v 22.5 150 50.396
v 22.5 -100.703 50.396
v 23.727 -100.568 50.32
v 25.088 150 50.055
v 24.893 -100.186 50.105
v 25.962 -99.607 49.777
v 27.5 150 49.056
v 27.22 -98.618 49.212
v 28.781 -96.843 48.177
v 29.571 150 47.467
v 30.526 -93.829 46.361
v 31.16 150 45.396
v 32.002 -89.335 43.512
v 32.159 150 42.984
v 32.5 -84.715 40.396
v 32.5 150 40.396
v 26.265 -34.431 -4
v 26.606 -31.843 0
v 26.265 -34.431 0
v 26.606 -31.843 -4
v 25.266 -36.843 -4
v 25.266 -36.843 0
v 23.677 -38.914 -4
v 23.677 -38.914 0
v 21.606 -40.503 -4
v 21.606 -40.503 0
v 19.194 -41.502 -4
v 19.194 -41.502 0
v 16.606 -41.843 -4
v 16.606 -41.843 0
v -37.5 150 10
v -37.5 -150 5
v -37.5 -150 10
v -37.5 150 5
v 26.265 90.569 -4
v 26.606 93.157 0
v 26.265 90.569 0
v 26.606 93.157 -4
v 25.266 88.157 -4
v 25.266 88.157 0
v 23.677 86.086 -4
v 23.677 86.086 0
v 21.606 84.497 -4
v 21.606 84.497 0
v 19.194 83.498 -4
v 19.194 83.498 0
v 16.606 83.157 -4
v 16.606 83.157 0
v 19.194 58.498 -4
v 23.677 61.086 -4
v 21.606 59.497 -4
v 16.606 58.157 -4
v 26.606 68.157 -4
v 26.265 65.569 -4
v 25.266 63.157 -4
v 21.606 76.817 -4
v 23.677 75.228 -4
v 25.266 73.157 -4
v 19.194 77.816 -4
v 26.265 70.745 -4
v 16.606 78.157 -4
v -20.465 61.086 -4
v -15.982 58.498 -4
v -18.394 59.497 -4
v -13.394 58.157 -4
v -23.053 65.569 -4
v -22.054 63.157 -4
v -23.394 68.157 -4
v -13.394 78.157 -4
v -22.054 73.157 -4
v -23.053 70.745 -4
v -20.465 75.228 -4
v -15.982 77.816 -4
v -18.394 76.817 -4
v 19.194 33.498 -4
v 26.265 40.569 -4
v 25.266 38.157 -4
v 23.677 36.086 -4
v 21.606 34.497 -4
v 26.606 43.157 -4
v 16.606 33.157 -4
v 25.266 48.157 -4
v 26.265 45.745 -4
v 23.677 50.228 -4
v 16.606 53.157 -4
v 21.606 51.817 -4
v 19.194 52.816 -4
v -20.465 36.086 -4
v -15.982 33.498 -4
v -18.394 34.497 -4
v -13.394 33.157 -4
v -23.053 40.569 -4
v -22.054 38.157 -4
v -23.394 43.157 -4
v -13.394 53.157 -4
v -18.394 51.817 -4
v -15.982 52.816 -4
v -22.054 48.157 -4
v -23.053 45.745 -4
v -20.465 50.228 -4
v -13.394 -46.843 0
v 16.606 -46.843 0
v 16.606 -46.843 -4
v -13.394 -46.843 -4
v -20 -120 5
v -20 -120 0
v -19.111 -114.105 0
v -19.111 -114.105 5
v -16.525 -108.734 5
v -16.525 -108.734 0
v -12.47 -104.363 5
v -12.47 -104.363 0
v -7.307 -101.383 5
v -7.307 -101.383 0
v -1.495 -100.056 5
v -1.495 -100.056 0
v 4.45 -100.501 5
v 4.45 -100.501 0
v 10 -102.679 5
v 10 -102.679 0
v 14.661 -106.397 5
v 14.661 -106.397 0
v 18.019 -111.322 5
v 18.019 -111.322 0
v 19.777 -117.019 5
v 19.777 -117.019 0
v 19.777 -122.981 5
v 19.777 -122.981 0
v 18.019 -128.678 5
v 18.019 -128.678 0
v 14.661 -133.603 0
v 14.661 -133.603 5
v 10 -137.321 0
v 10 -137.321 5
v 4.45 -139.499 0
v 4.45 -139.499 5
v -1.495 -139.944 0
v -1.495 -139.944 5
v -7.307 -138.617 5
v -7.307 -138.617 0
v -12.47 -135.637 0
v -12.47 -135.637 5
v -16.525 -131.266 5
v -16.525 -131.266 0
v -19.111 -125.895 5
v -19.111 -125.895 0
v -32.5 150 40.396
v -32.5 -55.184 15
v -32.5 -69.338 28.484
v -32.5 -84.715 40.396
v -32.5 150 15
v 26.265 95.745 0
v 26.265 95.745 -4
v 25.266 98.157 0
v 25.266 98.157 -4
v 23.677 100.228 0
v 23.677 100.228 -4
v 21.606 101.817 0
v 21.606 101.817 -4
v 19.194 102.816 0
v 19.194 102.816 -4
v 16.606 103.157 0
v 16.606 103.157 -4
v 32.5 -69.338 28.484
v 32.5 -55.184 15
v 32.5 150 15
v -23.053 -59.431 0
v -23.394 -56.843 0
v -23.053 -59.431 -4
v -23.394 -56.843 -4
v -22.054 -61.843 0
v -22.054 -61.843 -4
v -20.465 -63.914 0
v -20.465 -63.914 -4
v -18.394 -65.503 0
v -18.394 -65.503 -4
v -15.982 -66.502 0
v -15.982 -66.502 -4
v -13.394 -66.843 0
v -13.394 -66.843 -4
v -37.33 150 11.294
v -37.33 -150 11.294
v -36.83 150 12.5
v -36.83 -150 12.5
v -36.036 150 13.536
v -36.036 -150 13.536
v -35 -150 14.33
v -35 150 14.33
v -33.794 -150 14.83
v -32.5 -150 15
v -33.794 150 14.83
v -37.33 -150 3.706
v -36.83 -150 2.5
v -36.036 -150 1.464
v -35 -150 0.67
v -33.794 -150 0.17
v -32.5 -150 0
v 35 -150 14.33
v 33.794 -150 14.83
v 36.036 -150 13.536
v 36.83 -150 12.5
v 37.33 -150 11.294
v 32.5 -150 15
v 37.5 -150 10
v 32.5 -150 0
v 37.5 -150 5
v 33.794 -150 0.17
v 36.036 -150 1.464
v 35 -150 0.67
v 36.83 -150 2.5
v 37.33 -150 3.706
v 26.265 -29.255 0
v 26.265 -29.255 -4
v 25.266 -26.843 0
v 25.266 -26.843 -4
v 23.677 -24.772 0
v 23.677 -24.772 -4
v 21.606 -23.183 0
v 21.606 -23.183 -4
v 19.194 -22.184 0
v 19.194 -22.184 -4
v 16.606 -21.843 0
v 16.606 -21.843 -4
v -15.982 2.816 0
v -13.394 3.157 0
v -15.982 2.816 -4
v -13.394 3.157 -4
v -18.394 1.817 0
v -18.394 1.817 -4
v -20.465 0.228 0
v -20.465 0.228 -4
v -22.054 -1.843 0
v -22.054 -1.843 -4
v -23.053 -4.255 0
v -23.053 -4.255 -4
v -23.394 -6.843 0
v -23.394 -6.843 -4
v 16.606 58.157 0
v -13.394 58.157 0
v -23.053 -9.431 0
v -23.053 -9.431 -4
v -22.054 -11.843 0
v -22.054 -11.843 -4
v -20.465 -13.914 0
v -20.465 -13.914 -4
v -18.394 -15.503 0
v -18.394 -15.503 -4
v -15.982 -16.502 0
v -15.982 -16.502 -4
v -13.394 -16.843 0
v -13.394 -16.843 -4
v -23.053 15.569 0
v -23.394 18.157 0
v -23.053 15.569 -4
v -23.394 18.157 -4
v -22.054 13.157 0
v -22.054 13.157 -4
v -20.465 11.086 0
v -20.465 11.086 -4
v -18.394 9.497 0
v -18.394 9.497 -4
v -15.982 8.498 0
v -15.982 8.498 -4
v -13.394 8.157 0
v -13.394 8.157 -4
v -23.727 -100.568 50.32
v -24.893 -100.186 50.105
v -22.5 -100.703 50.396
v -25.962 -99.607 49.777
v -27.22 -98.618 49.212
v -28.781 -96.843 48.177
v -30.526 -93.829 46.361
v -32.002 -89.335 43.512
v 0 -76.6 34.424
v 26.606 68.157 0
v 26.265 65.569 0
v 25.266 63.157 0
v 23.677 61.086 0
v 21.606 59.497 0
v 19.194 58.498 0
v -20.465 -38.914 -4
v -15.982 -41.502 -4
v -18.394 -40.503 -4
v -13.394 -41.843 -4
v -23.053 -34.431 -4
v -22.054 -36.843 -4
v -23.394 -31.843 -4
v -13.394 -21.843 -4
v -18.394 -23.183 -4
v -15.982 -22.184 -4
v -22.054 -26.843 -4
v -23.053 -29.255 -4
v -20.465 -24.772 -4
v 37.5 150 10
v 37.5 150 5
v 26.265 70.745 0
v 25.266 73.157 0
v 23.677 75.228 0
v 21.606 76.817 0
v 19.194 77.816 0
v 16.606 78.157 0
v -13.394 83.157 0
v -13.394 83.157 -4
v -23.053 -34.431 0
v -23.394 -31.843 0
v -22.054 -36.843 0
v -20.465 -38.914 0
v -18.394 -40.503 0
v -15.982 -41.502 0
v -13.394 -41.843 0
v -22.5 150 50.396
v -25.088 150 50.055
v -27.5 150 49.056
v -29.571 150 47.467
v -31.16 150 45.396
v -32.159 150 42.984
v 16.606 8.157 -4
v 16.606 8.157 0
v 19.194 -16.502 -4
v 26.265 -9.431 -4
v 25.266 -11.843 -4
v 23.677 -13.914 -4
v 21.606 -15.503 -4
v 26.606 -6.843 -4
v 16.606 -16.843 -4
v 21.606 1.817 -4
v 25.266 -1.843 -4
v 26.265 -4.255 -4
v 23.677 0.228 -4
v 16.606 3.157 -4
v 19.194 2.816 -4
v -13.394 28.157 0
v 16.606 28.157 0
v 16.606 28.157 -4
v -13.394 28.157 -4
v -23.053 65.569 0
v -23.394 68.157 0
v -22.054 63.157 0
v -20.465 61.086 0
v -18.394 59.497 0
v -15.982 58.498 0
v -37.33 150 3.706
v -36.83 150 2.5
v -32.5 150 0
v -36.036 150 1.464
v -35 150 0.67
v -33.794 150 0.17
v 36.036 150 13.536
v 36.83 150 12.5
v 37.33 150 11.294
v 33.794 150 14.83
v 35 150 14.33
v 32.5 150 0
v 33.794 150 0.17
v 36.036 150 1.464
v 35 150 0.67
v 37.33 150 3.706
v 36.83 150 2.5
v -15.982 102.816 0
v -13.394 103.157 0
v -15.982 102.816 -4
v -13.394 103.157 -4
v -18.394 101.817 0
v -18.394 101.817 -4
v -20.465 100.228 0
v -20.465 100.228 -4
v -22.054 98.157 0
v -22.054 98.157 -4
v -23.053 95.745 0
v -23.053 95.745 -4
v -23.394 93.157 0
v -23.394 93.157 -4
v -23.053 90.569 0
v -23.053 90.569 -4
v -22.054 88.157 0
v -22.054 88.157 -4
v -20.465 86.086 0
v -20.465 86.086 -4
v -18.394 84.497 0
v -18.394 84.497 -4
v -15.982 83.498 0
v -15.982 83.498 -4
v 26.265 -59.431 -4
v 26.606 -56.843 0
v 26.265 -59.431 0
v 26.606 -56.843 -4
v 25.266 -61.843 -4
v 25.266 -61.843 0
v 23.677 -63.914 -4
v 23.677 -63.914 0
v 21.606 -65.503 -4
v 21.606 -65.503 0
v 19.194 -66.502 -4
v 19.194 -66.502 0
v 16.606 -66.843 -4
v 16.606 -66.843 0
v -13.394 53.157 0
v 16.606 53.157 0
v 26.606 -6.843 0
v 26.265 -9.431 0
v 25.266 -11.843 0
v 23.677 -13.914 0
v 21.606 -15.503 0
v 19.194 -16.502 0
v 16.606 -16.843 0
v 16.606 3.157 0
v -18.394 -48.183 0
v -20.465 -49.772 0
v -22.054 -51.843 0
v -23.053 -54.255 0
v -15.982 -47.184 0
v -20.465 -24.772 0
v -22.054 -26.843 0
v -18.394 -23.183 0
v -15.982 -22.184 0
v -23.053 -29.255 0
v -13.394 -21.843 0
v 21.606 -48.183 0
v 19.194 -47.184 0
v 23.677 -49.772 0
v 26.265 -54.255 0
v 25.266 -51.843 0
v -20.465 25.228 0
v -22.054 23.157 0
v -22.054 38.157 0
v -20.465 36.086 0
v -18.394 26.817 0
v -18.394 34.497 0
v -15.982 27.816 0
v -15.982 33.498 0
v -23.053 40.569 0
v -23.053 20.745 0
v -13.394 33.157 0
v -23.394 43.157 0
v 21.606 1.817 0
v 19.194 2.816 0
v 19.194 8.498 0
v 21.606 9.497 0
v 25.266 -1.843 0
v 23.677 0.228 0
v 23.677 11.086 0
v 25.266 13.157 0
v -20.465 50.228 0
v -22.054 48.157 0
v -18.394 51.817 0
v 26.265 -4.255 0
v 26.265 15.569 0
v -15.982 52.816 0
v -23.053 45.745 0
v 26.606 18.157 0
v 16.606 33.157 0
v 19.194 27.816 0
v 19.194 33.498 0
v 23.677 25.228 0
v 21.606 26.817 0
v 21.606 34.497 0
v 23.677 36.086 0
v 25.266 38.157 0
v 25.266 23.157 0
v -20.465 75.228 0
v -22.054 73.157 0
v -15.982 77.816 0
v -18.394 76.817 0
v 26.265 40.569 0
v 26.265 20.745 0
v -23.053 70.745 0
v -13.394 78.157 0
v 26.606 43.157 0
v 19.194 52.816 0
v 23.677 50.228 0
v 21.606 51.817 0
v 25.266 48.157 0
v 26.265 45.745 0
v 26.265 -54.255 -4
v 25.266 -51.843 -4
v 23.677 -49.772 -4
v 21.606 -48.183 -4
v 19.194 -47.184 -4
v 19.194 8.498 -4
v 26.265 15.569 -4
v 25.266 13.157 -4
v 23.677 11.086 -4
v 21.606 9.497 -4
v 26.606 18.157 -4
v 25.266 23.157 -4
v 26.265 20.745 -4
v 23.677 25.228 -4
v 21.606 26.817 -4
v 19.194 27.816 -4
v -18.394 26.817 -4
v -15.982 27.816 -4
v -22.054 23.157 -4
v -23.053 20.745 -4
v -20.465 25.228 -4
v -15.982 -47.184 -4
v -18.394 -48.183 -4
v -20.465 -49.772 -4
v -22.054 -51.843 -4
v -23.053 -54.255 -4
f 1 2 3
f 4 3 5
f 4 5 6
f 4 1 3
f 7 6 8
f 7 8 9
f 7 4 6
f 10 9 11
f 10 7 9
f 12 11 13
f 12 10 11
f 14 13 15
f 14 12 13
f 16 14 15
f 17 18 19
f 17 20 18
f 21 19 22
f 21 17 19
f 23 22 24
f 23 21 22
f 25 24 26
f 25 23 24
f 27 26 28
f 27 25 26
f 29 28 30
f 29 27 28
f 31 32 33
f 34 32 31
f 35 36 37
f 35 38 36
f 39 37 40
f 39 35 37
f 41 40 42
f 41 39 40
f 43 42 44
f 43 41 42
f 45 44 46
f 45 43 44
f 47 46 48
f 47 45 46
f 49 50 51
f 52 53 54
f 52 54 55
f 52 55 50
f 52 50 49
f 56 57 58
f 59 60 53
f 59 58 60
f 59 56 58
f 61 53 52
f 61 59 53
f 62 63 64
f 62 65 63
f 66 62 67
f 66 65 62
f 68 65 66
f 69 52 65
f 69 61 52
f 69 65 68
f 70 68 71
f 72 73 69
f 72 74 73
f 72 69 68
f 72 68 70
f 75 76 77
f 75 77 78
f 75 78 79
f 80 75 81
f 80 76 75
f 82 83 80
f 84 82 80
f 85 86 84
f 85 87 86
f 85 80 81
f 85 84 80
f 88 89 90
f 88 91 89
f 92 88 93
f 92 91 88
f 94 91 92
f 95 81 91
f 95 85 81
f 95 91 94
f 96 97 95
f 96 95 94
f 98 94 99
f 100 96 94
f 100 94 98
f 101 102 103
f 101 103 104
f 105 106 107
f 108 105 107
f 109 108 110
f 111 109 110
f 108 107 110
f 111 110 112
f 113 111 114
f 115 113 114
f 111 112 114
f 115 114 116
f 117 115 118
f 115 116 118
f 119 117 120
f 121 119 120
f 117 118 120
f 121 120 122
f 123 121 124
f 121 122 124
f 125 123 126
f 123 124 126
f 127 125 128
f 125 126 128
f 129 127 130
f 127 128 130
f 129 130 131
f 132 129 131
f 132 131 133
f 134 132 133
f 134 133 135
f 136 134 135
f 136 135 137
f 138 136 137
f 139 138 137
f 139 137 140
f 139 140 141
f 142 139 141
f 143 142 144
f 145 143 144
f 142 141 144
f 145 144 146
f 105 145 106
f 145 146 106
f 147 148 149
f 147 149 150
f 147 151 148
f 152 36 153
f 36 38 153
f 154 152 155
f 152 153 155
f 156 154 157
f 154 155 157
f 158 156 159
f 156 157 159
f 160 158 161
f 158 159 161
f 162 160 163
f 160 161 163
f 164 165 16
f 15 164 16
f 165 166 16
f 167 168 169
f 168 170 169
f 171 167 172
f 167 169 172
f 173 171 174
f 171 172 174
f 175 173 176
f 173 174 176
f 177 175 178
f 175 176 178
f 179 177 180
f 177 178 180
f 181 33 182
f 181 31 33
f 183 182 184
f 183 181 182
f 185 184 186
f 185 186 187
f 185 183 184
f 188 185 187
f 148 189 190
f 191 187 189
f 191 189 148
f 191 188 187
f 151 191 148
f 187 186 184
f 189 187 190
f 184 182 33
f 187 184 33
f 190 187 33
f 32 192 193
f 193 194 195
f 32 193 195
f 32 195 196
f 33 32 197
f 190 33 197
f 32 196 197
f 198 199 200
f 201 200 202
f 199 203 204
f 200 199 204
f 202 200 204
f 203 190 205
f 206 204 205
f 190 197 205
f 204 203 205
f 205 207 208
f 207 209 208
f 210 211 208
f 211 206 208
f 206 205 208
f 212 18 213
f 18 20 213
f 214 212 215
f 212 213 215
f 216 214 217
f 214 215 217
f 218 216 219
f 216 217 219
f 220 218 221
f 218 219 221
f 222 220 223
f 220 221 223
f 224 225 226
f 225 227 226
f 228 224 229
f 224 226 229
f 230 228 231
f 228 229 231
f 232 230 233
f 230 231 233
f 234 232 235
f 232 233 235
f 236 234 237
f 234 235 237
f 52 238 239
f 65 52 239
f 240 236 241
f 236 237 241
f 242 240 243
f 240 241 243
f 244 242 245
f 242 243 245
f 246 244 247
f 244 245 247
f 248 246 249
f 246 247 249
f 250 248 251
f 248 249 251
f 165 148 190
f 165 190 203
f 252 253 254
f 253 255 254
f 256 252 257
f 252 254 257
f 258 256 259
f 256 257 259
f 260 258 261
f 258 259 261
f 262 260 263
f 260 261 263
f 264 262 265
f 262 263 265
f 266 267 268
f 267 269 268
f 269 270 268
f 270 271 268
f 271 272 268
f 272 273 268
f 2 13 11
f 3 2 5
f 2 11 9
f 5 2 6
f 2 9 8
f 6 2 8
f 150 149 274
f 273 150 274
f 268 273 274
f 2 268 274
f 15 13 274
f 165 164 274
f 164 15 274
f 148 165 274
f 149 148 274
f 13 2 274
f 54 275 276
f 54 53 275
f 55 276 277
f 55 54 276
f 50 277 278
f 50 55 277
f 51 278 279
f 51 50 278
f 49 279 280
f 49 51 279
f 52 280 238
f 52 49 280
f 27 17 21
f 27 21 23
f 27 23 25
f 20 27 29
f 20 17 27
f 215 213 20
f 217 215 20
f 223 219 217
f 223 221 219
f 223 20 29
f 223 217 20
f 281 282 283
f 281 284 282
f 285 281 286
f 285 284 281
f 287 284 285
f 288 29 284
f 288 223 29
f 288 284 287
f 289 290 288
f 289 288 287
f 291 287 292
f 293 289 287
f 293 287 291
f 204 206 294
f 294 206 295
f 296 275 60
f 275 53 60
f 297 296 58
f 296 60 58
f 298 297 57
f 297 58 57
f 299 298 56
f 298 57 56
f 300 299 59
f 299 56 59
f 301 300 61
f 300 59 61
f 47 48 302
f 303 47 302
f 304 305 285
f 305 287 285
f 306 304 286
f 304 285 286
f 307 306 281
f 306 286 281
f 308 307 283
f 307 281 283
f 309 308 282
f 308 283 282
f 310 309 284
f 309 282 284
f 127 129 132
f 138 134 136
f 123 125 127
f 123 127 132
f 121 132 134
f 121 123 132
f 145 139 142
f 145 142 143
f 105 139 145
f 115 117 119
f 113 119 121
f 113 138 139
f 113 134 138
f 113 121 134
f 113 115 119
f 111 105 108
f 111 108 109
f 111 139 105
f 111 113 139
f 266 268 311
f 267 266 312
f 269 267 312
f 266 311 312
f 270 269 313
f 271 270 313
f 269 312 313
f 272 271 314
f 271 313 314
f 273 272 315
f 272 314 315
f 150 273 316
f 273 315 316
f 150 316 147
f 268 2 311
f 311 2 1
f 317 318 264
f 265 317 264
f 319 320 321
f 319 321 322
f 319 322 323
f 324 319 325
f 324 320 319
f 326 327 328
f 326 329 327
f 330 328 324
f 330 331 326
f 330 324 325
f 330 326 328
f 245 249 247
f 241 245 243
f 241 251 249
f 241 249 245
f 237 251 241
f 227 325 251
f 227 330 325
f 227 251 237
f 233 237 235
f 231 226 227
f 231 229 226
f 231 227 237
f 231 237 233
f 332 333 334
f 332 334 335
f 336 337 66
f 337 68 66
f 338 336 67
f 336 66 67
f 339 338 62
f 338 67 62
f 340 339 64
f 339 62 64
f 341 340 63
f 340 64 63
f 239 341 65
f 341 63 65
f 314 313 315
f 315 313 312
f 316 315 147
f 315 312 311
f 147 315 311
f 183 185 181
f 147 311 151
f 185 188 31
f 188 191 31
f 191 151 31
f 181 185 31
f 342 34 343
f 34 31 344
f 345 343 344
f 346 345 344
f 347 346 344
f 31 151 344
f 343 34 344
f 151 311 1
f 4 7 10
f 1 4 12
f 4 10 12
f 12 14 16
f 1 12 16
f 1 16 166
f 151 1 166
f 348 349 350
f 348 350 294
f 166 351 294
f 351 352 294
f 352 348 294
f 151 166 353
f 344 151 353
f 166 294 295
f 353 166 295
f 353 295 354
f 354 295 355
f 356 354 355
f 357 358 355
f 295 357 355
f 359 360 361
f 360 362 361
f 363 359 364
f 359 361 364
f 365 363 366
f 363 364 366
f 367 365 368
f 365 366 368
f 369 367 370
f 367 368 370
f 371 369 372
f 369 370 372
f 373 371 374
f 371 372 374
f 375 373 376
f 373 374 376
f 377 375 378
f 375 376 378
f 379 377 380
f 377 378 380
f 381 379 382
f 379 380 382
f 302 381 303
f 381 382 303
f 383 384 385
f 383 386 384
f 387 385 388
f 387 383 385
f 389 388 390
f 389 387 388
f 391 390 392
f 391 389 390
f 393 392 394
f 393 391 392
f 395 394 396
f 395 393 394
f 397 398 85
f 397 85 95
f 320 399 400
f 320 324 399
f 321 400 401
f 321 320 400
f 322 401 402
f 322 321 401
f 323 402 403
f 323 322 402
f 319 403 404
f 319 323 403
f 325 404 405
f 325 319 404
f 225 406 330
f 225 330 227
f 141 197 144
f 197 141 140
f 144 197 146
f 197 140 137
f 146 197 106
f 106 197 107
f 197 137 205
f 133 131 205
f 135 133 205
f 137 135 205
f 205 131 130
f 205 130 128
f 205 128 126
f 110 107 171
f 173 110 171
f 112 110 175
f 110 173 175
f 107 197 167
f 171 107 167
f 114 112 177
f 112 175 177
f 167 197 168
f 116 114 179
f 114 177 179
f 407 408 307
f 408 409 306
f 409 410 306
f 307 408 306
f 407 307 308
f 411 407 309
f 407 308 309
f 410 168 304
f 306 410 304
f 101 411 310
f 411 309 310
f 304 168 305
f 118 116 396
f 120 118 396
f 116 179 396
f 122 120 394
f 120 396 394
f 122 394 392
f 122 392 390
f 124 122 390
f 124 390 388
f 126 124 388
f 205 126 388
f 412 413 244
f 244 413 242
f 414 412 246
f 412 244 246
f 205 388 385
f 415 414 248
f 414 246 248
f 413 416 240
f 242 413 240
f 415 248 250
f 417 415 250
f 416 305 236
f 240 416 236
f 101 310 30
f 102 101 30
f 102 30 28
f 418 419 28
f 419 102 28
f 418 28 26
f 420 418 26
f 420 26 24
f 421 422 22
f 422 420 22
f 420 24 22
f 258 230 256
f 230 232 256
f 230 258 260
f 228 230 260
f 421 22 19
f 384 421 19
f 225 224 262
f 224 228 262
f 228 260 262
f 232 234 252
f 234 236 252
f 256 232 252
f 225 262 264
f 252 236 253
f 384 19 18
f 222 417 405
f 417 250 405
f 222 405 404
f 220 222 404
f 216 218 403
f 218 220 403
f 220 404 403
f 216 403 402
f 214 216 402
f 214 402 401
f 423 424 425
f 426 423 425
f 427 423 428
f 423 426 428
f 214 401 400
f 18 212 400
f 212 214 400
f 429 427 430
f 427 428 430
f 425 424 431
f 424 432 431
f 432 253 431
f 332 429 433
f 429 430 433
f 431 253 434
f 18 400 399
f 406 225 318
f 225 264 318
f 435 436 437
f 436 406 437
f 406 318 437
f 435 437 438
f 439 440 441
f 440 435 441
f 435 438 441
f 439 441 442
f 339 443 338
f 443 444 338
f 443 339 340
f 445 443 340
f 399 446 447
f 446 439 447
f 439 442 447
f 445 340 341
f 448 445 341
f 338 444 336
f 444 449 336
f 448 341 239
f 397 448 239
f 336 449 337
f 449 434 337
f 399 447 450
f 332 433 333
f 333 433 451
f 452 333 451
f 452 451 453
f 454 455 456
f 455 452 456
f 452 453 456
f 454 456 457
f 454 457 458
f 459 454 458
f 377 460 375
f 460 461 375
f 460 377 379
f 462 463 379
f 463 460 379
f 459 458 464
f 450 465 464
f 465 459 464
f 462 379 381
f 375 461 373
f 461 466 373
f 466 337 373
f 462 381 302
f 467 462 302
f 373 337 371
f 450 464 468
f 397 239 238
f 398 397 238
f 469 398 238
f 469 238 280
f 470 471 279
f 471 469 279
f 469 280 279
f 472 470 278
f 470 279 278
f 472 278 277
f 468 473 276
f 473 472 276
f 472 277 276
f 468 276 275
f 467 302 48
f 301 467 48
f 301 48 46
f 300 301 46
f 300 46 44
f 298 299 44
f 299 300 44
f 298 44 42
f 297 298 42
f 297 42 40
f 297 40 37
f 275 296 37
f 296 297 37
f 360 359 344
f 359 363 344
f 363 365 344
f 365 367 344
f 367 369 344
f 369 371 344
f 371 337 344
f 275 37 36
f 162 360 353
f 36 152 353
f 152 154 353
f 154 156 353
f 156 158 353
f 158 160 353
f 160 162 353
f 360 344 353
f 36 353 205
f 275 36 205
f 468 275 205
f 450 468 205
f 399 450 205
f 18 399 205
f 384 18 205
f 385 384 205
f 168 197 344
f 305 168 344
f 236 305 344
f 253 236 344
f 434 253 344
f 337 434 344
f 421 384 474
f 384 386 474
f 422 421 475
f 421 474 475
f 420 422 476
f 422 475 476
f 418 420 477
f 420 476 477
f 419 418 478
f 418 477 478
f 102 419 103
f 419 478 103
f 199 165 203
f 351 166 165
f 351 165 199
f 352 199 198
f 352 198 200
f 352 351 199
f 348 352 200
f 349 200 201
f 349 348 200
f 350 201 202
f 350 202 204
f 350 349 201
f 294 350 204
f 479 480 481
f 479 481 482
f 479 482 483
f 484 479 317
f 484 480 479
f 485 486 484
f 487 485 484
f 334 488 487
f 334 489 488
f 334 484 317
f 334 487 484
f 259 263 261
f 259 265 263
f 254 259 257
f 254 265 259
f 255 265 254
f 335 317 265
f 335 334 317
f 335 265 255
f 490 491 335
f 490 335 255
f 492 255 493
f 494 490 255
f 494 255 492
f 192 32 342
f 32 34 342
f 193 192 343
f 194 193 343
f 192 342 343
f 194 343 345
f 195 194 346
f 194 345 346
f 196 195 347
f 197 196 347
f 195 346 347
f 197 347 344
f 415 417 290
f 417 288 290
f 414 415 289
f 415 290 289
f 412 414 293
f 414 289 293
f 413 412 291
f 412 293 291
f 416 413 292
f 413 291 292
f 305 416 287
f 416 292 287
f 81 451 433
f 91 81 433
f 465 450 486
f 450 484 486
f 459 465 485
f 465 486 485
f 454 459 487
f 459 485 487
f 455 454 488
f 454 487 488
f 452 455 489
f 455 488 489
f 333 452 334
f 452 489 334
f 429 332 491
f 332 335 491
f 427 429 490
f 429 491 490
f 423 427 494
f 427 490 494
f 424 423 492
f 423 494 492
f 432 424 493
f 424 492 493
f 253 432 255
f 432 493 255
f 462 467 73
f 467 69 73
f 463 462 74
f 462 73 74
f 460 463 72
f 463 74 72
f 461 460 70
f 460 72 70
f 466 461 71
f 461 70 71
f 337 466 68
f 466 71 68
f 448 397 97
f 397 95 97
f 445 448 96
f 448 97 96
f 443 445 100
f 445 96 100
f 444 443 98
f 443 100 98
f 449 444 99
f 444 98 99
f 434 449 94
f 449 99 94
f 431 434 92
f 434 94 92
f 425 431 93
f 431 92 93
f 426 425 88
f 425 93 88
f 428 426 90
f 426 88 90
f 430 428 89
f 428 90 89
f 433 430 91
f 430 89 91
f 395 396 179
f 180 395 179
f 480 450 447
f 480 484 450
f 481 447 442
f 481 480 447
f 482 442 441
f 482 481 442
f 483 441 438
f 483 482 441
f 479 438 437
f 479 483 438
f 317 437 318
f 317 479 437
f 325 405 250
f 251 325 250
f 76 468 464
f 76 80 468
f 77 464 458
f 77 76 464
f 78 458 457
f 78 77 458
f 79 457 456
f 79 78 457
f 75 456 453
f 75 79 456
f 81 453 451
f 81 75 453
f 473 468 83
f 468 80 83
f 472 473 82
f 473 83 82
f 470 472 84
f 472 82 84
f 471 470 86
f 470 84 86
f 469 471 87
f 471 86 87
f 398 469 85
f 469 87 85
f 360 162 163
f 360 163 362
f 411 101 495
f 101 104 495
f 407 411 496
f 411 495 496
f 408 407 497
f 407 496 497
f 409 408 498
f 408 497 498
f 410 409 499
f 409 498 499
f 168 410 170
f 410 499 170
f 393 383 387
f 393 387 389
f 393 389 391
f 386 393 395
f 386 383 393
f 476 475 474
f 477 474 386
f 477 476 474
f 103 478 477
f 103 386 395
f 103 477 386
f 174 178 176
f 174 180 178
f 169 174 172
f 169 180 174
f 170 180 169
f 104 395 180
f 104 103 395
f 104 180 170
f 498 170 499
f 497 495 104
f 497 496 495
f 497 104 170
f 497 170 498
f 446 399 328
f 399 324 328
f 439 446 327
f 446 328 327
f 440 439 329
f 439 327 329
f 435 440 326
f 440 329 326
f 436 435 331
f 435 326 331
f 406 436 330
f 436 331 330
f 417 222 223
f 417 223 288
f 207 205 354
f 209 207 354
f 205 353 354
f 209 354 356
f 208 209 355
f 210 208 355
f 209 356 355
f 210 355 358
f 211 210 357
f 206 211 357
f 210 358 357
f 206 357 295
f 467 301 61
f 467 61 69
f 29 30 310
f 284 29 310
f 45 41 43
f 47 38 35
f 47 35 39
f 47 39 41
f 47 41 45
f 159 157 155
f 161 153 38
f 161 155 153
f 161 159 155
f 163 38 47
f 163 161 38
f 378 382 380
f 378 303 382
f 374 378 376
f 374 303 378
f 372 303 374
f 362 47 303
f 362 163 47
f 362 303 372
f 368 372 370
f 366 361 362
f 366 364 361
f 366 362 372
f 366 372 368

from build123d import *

# Parameters (mm, degrees)
SKETCH3_W              = 75
SKETCH3_H              = 300
BOSS_EXTRUDE1_DEPTH    = 15
SKETCH4_R              = 20
CUT_EXTRUDE1_DEPTH     = 5
FILLET1_R              = 5
BOSS_EXTRUDE4_DEPTH    = 65
FILLET3_R              = 10
FILLET4_R              = 10
SKETCH12_W             = 50
SKETCH12_H             = 20
BOSS_EXTRUDE5_DEPTH    = 4
FILLET5_R              = 10
LPATTERN3_COUNT        = 7
LPATTERN3_PITCH        = 25
FILLET5_OF_LPATTERN3_R = 10


with BuildPart() as part:
    # Sketch3 → Boss-Extrude1 (new body)
    with BuildSketch(Plane.XY):
        Rectangle(SKETCH3_W, SKETCH3_H)
    extrude(amount=BOSS_EXTRUDE1_DEPTH)

    # Sketch4 → Cut-Extrude1 (cut)
    with BuildSketch(Plane(origin=(0, 0, 0), x_dir=(-1, 0, 0), z_dir=(0, 0, -1))):
        with Locations((0, -120)):
            Circle(SKETCH4_R)
    extrude(amount=-CUT_EXTRUDE1_DEPTH, mode=Mode.SUBTRACT)

    # Fillet1
    fillet1_edges = [part.edges().sort_by_distance(p)[0] for p in [
        (37.5, 0, 15),
        (-37.5, 0, 15),
        (37.5, 0, 0),
        (-37.5, 0, 0),
    ]]
    fillet(fillet1_edges, radius=FILLET1_R)

    # Sketch11 → Boss-Extrude4 (add)
    with BuildSketch(Plane(origin=(32.5, 0, 0), x_dir=(0, 0, -1), z_dir=(1, 0, 0))):
        with BuildLine():
            Line((-15, 150), (-15, -55.184099518))
            add(Edge.make_bspline(
                [(-15, -55.184099518), (-36.150035241, -75.256670259), (-50.395734878, -100.703118223)],
                knots=[0, 0, 0, 1, 1, 1], degree=2))
            Line((-50.395734878, -100.703118223), (-50.395734878, 150))
            Line((-50.395734878, 150), (-15, 150))
        make_face()
    extrude(amount=-BOSS_EXTRUDE4_DEPTH)

    # Fillet3
    fillet3_edges = [part.edges().sort_by_distance(p)[0] for p in [
        (-32.5, 24.648440888, 50.395734878),
    ]]
    fillet(fillet3_edges, radius=FILLET3_R)

    # Fillet4
    fillet4_edges = [part.edges().sort_by_distance(p)[0] for p in [
        (32.5, 24.648440888, 50.395734878),
    ]]
    fillet(fillet4_edges, radius=FILLET4_R)

    # Sketch12 → Boss-Extrude5 (add)
    with BuildSketch(Plane(origin=(0, 0, 0), x_dir=(-1, 0, 0), z_dir=(0, 0, -1))):
        with Locations((-1.606045565, -56.843050926)):
            Rectangle(SKETCH12_W, SKETCH12_H)
    boss_extrude5 = extrude(amount=BOSS_EXTRUDE5_DEPTH)

    # Fillet5
    fillet5_edges = [part.edges().sort_by_distance(p)[0] for p in [
        (-23.393954435, -66.843050926, -2),
        (-23.393954435, -46.843050926, -2),
        (26.606045565, -66.843050926, -2),
        (26.606045565, -46.843050926, -2),
    ]]
    fillet(fillet5_edges, radius=FILLET5_R - 0.0001)  # a hair under: the kernel refuses the full size

    # LPattern3: Boss-Extrude5 ×7
    with Locations(*[(0, i * LPATTERN3_PITCH, 0) for i in range(1, LPATTERN3_COUNT)]):
        add(boss_extrude5)

    # Fillet5 of LPattern3
    fillet5_of_lpattern3_edges = [part.edges().sort_by_distance(p)[0] for p in [
        (-23.393954435, -41.843050926, -2),
        (-23.393954435, -21.843050926, -2),
        (26.606045565, -41.843050926, -2),
        (26.606045565, -21.843050926, -2),
        (-23.393954435, -16.843050926, -2),
        (-23.393954435, 3.156949074, -2),
        (26.606045565, -16.843050926, -2),
        (26.606045565, 3.156949074, -2),
        (-23.393954435, 8.156949074, -2),
        (-23.393954435, 28.156949074, -2),
        (26.606045565, 8.156949074, -2),
        (26.606045565, 28.156949074, -2),
        (-23.393954435, 33.156949074, -2),
        (-23.393954435, 53.156949074, -2),
        (26.606045565, 33.156949074, -2),
        (26.606045565, 53.156949074, -2),
        (-23.393954435, 58.156949074, -2),
        (-23.393954435, 78.156949074, -2),
        (26.606045565, 58.156949074, -2),
        (26.606045565, 78.156949074, -2),
        (-23.393954435, 83.156949074, -2),
        (-23.393954435, 103.156949074, -2),
        (26.606045565, 83.156949074, -2),
        (26.606045565, 103.156949074, -2),
    ]]
    fillet(fillet5_of_lpattern3_edges, radius=FILLET5_OF_LPATTERN3_R - 0.0001)  # a hair under: the kernel refuses the full size


solid = part.part
